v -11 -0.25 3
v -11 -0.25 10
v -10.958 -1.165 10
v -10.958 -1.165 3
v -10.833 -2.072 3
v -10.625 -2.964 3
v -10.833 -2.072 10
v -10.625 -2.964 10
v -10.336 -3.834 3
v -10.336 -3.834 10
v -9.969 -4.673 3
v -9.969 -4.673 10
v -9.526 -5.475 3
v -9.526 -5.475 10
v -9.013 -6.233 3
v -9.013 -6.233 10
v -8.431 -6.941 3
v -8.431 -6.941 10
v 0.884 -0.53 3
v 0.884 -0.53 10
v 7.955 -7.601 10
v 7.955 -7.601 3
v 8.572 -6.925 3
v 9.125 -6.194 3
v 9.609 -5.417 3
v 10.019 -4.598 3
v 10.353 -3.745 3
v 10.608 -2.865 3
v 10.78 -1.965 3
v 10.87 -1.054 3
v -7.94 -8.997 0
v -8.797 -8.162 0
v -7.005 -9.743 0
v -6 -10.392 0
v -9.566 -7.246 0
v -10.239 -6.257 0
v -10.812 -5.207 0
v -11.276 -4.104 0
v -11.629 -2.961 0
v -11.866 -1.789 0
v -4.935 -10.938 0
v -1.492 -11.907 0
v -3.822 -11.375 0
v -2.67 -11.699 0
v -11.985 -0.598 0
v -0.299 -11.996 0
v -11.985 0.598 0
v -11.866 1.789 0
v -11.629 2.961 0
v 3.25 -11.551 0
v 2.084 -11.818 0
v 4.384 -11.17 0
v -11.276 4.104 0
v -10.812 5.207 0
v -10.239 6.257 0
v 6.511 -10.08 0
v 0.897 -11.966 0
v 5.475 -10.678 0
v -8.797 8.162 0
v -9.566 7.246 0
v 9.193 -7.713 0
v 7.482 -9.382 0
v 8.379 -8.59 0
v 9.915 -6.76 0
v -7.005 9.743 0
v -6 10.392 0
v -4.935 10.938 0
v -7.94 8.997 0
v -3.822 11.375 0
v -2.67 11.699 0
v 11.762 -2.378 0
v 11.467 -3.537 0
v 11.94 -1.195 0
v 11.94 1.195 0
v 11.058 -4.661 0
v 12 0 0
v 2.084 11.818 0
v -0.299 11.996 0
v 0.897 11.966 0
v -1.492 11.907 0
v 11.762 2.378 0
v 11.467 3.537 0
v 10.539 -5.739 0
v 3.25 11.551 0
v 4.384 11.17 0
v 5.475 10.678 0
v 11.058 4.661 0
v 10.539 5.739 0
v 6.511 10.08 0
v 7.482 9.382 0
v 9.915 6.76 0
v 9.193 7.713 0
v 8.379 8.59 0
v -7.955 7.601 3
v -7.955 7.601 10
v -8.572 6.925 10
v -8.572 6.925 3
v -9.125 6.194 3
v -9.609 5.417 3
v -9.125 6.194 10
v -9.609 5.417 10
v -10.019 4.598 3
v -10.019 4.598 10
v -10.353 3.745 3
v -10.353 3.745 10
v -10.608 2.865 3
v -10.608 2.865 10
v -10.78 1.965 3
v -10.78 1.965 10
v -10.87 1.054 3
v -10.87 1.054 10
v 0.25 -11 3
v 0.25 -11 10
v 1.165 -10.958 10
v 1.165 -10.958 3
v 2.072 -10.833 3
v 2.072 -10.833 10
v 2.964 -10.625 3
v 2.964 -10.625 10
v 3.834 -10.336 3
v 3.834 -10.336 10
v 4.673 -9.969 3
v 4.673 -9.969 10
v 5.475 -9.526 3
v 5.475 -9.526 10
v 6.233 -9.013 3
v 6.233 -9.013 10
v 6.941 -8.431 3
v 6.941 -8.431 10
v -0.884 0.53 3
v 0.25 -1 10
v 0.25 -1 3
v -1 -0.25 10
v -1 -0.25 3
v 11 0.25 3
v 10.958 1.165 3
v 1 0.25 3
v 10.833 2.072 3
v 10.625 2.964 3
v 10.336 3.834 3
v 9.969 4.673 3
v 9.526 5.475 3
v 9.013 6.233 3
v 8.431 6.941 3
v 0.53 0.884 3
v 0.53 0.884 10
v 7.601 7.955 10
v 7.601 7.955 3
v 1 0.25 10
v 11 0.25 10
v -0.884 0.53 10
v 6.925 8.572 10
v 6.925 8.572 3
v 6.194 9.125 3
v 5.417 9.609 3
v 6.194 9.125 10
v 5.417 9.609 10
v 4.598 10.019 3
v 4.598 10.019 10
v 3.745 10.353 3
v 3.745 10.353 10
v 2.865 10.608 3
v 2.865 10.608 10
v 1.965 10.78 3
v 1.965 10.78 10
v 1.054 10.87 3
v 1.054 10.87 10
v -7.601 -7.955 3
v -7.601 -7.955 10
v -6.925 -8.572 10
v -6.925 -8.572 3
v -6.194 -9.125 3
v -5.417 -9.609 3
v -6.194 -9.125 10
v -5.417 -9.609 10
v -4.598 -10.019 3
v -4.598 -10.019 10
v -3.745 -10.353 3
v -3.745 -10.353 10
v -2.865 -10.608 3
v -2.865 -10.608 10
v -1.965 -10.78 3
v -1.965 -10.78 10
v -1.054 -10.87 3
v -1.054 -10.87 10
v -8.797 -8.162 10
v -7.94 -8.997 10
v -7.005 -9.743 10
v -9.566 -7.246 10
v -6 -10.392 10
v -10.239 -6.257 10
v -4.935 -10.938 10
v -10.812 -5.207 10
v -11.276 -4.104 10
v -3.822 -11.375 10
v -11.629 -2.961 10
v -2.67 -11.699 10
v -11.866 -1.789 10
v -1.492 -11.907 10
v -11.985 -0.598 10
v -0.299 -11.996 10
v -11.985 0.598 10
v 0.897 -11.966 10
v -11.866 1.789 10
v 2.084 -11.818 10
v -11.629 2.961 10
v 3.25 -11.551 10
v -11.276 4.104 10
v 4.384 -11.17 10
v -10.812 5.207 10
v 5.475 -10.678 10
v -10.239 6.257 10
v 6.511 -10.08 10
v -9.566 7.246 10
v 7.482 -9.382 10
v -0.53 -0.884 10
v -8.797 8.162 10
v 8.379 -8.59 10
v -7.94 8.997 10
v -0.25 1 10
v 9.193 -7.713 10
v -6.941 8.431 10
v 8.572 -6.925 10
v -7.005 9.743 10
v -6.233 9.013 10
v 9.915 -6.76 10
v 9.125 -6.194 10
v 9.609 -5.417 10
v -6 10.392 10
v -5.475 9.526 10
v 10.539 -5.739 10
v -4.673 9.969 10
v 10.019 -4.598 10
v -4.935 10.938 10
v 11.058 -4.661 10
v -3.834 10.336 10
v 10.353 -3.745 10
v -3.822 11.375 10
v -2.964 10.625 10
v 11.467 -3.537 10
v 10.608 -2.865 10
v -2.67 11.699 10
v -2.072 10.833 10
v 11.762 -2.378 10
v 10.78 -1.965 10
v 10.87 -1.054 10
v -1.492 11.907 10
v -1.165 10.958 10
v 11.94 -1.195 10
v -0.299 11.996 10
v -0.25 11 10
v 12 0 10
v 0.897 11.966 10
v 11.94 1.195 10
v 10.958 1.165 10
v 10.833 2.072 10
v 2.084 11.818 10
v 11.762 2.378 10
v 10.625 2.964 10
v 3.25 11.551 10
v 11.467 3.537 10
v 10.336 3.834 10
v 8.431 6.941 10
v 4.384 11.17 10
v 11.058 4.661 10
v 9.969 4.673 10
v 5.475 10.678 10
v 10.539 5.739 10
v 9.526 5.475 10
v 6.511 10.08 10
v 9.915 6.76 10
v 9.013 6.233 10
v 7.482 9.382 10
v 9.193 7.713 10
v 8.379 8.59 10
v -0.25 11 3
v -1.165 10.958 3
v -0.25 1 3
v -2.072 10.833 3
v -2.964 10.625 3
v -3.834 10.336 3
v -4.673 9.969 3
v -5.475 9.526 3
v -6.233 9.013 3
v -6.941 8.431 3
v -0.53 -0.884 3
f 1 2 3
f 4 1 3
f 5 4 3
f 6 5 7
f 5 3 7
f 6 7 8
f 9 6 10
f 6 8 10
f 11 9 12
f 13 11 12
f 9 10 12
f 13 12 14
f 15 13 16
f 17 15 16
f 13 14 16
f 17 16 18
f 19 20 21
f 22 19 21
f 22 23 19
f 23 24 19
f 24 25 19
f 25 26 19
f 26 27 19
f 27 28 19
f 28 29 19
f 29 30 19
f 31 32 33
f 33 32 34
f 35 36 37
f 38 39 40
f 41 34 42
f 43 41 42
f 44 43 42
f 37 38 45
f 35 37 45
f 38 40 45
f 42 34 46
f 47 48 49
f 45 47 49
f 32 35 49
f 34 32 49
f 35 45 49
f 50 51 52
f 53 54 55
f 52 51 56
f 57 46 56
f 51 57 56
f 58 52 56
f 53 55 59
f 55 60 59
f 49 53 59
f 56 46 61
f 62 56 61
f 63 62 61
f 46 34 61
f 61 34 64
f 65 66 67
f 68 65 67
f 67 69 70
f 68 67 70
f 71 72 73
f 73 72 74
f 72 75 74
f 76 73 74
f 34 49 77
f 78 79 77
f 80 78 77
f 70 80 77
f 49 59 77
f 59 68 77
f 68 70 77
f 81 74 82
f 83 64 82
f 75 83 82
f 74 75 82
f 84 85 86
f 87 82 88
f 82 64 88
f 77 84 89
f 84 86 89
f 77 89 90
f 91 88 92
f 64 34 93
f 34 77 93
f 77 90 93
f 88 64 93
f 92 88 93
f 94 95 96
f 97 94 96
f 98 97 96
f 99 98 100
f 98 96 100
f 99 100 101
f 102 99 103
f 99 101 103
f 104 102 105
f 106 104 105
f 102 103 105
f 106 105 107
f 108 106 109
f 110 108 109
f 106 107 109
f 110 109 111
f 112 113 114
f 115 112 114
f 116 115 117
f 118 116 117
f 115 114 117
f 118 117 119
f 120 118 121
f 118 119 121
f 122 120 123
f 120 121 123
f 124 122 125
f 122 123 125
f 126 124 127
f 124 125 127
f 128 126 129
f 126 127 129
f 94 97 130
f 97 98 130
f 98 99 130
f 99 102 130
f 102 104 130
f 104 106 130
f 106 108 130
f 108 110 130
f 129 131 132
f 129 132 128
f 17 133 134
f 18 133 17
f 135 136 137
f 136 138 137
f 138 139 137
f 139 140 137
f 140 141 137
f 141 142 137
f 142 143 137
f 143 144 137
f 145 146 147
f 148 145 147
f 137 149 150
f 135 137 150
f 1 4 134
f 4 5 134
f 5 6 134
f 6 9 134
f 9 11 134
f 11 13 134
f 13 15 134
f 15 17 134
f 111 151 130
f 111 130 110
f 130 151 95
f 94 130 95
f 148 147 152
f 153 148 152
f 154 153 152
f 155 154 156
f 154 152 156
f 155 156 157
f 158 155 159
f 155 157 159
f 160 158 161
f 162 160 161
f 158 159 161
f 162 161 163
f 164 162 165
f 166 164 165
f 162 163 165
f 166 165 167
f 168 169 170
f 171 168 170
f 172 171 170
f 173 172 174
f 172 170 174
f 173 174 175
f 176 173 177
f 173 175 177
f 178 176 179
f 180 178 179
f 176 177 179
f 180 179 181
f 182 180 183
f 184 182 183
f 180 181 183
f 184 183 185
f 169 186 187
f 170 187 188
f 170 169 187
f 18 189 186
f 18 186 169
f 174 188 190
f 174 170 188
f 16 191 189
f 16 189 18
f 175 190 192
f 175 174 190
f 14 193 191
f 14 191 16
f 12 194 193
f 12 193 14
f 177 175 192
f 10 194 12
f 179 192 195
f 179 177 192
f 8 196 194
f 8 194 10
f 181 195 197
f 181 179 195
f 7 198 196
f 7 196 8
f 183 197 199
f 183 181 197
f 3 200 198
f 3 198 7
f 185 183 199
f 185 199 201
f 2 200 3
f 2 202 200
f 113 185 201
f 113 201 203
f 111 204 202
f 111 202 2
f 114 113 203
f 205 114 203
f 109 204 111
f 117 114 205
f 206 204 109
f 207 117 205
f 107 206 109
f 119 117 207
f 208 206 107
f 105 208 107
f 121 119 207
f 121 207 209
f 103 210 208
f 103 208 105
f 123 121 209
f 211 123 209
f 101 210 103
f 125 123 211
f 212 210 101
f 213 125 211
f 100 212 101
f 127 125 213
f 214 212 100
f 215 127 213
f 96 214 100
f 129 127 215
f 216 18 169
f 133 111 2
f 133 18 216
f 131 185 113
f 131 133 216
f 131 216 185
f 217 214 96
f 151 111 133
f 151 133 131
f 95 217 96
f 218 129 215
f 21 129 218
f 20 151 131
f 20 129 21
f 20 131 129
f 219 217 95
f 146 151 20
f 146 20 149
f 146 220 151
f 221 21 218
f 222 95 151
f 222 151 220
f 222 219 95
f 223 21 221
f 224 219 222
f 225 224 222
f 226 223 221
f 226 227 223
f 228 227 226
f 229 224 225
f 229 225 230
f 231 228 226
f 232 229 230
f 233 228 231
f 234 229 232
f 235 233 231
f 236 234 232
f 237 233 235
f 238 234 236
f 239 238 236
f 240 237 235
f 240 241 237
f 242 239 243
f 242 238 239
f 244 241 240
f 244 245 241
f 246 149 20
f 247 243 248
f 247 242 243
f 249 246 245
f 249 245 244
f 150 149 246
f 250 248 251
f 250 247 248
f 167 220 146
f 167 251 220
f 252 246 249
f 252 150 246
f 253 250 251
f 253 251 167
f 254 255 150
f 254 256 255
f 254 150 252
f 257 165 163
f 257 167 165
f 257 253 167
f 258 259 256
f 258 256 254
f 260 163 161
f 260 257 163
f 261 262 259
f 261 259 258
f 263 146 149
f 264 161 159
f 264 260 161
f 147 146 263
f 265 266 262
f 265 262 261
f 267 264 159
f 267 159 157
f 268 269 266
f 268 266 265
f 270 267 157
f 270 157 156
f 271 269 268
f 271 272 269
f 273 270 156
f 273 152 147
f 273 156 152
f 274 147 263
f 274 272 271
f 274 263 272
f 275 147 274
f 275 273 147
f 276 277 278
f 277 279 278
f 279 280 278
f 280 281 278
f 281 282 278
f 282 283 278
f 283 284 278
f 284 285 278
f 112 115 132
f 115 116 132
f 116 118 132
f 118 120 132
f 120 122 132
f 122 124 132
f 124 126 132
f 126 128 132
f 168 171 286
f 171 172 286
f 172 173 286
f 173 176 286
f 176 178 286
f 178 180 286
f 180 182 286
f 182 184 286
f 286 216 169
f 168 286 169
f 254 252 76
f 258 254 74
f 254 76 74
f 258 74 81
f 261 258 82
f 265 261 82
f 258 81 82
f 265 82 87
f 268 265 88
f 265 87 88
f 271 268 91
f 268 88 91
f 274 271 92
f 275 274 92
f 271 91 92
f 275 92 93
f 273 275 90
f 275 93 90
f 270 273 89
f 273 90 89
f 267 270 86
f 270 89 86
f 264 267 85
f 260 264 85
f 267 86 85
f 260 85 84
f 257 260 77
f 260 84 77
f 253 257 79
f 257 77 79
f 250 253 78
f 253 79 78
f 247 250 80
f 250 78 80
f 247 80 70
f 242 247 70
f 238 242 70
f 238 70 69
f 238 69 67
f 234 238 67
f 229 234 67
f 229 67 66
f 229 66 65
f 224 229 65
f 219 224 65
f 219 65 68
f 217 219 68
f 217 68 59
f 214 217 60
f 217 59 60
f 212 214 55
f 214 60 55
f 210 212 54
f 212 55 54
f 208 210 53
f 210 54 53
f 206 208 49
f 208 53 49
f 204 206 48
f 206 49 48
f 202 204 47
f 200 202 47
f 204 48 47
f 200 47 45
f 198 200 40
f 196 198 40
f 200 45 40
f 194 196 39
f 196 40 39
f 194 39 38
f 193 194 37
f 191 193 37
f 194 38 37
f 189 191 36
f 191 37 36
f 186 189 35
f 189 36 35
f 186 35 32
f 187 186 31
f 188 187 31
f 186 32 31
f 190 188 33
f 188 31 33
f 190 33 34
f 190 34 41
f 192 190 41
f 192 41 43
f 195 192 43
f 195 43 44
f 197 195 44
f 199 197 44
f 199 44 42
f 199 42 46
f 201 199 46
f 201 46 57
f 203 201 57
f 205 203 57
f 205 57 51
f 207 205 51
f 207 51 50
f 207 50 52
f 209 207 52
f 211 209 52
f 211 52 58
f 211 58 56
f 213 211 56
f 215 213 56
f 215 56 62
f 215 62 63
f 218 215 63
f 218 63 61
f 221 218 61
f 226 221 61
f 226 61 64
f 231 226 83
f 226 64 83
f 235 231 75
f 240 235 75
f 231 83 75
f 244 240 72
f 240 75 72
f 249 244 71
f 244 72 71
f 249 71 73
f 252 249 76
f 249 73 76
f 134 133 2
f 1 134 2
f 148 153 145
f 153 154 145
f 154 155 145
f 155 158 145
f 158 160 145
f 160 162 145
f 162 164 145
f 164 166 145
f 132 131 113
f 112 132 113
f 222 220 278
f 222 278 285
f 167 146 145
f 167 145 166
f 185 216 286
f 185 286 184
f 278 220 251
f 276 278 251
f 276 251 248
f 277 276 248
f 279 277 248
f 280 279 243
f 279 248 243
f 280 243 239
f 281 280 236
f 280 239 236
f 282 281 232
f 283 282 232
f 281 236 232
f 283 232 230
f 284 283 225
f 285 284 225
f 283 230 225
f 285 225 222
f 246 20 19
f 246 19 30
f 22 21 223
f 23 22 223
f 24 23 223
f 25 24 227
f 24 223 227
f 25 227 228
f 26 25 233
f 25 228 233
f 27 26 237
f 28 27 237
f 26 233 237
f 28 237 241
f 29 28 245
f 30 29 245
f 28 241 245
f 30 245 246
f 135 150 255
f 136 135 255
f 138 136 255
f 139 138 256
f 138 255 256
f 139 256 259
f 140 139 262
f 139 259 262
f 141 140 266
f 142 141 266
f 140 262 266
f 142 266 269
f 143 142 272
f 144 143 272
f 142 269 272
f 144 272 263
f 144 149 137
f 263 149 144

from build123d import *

# Parameters (mm, degrees)
CYLINDER001_W     = 10
CYLINDER001_H     = 12
CYLINDER001_ANGLE = 42
ARRAY_COUNT       = 8
CYLINDER_R        = 12
CYLINDER_DEPTH    = 10


with BuildPart() as array:
    # Cylinder001 → Cylinder001 (revolve)
    with BuildSketch(Plane(origin=(1, 0.25, 3), x_dir=(1, 0, 0), z_dir=(0, -1, 0))):
        with Locations((5, 6)):
            Rectangle(CYLINDER001_W, CYLINDER001_H)
    revolve(axis=Axis((1, 0.25, 3), (0, 0, 1)), revolution_arc=CYLINDER001_ANGLE)

    # Array: Array ×8 about axis
    array_axis = Axis((0, 0, 0), (0, 0, 1))


with BuildPart() as array_1:
    add(array.part)
    for i in range(1, ARRAY_COUNT):
        add(array.part.rotate(array_axis, i * 360 / ARRAY_COUNT))


with BuildPart() as cut:
    # Cylinder → Cylinder (new body)
    with BuildSketch(Plane.XY):
        Circle(CYLINDER_R)
    extrude(amount=CYLINDER_DEPTH)

    # Cut: cut Array
    add(array_1.part, mode=Mode.SUBTRACT)


solid = cut.part
